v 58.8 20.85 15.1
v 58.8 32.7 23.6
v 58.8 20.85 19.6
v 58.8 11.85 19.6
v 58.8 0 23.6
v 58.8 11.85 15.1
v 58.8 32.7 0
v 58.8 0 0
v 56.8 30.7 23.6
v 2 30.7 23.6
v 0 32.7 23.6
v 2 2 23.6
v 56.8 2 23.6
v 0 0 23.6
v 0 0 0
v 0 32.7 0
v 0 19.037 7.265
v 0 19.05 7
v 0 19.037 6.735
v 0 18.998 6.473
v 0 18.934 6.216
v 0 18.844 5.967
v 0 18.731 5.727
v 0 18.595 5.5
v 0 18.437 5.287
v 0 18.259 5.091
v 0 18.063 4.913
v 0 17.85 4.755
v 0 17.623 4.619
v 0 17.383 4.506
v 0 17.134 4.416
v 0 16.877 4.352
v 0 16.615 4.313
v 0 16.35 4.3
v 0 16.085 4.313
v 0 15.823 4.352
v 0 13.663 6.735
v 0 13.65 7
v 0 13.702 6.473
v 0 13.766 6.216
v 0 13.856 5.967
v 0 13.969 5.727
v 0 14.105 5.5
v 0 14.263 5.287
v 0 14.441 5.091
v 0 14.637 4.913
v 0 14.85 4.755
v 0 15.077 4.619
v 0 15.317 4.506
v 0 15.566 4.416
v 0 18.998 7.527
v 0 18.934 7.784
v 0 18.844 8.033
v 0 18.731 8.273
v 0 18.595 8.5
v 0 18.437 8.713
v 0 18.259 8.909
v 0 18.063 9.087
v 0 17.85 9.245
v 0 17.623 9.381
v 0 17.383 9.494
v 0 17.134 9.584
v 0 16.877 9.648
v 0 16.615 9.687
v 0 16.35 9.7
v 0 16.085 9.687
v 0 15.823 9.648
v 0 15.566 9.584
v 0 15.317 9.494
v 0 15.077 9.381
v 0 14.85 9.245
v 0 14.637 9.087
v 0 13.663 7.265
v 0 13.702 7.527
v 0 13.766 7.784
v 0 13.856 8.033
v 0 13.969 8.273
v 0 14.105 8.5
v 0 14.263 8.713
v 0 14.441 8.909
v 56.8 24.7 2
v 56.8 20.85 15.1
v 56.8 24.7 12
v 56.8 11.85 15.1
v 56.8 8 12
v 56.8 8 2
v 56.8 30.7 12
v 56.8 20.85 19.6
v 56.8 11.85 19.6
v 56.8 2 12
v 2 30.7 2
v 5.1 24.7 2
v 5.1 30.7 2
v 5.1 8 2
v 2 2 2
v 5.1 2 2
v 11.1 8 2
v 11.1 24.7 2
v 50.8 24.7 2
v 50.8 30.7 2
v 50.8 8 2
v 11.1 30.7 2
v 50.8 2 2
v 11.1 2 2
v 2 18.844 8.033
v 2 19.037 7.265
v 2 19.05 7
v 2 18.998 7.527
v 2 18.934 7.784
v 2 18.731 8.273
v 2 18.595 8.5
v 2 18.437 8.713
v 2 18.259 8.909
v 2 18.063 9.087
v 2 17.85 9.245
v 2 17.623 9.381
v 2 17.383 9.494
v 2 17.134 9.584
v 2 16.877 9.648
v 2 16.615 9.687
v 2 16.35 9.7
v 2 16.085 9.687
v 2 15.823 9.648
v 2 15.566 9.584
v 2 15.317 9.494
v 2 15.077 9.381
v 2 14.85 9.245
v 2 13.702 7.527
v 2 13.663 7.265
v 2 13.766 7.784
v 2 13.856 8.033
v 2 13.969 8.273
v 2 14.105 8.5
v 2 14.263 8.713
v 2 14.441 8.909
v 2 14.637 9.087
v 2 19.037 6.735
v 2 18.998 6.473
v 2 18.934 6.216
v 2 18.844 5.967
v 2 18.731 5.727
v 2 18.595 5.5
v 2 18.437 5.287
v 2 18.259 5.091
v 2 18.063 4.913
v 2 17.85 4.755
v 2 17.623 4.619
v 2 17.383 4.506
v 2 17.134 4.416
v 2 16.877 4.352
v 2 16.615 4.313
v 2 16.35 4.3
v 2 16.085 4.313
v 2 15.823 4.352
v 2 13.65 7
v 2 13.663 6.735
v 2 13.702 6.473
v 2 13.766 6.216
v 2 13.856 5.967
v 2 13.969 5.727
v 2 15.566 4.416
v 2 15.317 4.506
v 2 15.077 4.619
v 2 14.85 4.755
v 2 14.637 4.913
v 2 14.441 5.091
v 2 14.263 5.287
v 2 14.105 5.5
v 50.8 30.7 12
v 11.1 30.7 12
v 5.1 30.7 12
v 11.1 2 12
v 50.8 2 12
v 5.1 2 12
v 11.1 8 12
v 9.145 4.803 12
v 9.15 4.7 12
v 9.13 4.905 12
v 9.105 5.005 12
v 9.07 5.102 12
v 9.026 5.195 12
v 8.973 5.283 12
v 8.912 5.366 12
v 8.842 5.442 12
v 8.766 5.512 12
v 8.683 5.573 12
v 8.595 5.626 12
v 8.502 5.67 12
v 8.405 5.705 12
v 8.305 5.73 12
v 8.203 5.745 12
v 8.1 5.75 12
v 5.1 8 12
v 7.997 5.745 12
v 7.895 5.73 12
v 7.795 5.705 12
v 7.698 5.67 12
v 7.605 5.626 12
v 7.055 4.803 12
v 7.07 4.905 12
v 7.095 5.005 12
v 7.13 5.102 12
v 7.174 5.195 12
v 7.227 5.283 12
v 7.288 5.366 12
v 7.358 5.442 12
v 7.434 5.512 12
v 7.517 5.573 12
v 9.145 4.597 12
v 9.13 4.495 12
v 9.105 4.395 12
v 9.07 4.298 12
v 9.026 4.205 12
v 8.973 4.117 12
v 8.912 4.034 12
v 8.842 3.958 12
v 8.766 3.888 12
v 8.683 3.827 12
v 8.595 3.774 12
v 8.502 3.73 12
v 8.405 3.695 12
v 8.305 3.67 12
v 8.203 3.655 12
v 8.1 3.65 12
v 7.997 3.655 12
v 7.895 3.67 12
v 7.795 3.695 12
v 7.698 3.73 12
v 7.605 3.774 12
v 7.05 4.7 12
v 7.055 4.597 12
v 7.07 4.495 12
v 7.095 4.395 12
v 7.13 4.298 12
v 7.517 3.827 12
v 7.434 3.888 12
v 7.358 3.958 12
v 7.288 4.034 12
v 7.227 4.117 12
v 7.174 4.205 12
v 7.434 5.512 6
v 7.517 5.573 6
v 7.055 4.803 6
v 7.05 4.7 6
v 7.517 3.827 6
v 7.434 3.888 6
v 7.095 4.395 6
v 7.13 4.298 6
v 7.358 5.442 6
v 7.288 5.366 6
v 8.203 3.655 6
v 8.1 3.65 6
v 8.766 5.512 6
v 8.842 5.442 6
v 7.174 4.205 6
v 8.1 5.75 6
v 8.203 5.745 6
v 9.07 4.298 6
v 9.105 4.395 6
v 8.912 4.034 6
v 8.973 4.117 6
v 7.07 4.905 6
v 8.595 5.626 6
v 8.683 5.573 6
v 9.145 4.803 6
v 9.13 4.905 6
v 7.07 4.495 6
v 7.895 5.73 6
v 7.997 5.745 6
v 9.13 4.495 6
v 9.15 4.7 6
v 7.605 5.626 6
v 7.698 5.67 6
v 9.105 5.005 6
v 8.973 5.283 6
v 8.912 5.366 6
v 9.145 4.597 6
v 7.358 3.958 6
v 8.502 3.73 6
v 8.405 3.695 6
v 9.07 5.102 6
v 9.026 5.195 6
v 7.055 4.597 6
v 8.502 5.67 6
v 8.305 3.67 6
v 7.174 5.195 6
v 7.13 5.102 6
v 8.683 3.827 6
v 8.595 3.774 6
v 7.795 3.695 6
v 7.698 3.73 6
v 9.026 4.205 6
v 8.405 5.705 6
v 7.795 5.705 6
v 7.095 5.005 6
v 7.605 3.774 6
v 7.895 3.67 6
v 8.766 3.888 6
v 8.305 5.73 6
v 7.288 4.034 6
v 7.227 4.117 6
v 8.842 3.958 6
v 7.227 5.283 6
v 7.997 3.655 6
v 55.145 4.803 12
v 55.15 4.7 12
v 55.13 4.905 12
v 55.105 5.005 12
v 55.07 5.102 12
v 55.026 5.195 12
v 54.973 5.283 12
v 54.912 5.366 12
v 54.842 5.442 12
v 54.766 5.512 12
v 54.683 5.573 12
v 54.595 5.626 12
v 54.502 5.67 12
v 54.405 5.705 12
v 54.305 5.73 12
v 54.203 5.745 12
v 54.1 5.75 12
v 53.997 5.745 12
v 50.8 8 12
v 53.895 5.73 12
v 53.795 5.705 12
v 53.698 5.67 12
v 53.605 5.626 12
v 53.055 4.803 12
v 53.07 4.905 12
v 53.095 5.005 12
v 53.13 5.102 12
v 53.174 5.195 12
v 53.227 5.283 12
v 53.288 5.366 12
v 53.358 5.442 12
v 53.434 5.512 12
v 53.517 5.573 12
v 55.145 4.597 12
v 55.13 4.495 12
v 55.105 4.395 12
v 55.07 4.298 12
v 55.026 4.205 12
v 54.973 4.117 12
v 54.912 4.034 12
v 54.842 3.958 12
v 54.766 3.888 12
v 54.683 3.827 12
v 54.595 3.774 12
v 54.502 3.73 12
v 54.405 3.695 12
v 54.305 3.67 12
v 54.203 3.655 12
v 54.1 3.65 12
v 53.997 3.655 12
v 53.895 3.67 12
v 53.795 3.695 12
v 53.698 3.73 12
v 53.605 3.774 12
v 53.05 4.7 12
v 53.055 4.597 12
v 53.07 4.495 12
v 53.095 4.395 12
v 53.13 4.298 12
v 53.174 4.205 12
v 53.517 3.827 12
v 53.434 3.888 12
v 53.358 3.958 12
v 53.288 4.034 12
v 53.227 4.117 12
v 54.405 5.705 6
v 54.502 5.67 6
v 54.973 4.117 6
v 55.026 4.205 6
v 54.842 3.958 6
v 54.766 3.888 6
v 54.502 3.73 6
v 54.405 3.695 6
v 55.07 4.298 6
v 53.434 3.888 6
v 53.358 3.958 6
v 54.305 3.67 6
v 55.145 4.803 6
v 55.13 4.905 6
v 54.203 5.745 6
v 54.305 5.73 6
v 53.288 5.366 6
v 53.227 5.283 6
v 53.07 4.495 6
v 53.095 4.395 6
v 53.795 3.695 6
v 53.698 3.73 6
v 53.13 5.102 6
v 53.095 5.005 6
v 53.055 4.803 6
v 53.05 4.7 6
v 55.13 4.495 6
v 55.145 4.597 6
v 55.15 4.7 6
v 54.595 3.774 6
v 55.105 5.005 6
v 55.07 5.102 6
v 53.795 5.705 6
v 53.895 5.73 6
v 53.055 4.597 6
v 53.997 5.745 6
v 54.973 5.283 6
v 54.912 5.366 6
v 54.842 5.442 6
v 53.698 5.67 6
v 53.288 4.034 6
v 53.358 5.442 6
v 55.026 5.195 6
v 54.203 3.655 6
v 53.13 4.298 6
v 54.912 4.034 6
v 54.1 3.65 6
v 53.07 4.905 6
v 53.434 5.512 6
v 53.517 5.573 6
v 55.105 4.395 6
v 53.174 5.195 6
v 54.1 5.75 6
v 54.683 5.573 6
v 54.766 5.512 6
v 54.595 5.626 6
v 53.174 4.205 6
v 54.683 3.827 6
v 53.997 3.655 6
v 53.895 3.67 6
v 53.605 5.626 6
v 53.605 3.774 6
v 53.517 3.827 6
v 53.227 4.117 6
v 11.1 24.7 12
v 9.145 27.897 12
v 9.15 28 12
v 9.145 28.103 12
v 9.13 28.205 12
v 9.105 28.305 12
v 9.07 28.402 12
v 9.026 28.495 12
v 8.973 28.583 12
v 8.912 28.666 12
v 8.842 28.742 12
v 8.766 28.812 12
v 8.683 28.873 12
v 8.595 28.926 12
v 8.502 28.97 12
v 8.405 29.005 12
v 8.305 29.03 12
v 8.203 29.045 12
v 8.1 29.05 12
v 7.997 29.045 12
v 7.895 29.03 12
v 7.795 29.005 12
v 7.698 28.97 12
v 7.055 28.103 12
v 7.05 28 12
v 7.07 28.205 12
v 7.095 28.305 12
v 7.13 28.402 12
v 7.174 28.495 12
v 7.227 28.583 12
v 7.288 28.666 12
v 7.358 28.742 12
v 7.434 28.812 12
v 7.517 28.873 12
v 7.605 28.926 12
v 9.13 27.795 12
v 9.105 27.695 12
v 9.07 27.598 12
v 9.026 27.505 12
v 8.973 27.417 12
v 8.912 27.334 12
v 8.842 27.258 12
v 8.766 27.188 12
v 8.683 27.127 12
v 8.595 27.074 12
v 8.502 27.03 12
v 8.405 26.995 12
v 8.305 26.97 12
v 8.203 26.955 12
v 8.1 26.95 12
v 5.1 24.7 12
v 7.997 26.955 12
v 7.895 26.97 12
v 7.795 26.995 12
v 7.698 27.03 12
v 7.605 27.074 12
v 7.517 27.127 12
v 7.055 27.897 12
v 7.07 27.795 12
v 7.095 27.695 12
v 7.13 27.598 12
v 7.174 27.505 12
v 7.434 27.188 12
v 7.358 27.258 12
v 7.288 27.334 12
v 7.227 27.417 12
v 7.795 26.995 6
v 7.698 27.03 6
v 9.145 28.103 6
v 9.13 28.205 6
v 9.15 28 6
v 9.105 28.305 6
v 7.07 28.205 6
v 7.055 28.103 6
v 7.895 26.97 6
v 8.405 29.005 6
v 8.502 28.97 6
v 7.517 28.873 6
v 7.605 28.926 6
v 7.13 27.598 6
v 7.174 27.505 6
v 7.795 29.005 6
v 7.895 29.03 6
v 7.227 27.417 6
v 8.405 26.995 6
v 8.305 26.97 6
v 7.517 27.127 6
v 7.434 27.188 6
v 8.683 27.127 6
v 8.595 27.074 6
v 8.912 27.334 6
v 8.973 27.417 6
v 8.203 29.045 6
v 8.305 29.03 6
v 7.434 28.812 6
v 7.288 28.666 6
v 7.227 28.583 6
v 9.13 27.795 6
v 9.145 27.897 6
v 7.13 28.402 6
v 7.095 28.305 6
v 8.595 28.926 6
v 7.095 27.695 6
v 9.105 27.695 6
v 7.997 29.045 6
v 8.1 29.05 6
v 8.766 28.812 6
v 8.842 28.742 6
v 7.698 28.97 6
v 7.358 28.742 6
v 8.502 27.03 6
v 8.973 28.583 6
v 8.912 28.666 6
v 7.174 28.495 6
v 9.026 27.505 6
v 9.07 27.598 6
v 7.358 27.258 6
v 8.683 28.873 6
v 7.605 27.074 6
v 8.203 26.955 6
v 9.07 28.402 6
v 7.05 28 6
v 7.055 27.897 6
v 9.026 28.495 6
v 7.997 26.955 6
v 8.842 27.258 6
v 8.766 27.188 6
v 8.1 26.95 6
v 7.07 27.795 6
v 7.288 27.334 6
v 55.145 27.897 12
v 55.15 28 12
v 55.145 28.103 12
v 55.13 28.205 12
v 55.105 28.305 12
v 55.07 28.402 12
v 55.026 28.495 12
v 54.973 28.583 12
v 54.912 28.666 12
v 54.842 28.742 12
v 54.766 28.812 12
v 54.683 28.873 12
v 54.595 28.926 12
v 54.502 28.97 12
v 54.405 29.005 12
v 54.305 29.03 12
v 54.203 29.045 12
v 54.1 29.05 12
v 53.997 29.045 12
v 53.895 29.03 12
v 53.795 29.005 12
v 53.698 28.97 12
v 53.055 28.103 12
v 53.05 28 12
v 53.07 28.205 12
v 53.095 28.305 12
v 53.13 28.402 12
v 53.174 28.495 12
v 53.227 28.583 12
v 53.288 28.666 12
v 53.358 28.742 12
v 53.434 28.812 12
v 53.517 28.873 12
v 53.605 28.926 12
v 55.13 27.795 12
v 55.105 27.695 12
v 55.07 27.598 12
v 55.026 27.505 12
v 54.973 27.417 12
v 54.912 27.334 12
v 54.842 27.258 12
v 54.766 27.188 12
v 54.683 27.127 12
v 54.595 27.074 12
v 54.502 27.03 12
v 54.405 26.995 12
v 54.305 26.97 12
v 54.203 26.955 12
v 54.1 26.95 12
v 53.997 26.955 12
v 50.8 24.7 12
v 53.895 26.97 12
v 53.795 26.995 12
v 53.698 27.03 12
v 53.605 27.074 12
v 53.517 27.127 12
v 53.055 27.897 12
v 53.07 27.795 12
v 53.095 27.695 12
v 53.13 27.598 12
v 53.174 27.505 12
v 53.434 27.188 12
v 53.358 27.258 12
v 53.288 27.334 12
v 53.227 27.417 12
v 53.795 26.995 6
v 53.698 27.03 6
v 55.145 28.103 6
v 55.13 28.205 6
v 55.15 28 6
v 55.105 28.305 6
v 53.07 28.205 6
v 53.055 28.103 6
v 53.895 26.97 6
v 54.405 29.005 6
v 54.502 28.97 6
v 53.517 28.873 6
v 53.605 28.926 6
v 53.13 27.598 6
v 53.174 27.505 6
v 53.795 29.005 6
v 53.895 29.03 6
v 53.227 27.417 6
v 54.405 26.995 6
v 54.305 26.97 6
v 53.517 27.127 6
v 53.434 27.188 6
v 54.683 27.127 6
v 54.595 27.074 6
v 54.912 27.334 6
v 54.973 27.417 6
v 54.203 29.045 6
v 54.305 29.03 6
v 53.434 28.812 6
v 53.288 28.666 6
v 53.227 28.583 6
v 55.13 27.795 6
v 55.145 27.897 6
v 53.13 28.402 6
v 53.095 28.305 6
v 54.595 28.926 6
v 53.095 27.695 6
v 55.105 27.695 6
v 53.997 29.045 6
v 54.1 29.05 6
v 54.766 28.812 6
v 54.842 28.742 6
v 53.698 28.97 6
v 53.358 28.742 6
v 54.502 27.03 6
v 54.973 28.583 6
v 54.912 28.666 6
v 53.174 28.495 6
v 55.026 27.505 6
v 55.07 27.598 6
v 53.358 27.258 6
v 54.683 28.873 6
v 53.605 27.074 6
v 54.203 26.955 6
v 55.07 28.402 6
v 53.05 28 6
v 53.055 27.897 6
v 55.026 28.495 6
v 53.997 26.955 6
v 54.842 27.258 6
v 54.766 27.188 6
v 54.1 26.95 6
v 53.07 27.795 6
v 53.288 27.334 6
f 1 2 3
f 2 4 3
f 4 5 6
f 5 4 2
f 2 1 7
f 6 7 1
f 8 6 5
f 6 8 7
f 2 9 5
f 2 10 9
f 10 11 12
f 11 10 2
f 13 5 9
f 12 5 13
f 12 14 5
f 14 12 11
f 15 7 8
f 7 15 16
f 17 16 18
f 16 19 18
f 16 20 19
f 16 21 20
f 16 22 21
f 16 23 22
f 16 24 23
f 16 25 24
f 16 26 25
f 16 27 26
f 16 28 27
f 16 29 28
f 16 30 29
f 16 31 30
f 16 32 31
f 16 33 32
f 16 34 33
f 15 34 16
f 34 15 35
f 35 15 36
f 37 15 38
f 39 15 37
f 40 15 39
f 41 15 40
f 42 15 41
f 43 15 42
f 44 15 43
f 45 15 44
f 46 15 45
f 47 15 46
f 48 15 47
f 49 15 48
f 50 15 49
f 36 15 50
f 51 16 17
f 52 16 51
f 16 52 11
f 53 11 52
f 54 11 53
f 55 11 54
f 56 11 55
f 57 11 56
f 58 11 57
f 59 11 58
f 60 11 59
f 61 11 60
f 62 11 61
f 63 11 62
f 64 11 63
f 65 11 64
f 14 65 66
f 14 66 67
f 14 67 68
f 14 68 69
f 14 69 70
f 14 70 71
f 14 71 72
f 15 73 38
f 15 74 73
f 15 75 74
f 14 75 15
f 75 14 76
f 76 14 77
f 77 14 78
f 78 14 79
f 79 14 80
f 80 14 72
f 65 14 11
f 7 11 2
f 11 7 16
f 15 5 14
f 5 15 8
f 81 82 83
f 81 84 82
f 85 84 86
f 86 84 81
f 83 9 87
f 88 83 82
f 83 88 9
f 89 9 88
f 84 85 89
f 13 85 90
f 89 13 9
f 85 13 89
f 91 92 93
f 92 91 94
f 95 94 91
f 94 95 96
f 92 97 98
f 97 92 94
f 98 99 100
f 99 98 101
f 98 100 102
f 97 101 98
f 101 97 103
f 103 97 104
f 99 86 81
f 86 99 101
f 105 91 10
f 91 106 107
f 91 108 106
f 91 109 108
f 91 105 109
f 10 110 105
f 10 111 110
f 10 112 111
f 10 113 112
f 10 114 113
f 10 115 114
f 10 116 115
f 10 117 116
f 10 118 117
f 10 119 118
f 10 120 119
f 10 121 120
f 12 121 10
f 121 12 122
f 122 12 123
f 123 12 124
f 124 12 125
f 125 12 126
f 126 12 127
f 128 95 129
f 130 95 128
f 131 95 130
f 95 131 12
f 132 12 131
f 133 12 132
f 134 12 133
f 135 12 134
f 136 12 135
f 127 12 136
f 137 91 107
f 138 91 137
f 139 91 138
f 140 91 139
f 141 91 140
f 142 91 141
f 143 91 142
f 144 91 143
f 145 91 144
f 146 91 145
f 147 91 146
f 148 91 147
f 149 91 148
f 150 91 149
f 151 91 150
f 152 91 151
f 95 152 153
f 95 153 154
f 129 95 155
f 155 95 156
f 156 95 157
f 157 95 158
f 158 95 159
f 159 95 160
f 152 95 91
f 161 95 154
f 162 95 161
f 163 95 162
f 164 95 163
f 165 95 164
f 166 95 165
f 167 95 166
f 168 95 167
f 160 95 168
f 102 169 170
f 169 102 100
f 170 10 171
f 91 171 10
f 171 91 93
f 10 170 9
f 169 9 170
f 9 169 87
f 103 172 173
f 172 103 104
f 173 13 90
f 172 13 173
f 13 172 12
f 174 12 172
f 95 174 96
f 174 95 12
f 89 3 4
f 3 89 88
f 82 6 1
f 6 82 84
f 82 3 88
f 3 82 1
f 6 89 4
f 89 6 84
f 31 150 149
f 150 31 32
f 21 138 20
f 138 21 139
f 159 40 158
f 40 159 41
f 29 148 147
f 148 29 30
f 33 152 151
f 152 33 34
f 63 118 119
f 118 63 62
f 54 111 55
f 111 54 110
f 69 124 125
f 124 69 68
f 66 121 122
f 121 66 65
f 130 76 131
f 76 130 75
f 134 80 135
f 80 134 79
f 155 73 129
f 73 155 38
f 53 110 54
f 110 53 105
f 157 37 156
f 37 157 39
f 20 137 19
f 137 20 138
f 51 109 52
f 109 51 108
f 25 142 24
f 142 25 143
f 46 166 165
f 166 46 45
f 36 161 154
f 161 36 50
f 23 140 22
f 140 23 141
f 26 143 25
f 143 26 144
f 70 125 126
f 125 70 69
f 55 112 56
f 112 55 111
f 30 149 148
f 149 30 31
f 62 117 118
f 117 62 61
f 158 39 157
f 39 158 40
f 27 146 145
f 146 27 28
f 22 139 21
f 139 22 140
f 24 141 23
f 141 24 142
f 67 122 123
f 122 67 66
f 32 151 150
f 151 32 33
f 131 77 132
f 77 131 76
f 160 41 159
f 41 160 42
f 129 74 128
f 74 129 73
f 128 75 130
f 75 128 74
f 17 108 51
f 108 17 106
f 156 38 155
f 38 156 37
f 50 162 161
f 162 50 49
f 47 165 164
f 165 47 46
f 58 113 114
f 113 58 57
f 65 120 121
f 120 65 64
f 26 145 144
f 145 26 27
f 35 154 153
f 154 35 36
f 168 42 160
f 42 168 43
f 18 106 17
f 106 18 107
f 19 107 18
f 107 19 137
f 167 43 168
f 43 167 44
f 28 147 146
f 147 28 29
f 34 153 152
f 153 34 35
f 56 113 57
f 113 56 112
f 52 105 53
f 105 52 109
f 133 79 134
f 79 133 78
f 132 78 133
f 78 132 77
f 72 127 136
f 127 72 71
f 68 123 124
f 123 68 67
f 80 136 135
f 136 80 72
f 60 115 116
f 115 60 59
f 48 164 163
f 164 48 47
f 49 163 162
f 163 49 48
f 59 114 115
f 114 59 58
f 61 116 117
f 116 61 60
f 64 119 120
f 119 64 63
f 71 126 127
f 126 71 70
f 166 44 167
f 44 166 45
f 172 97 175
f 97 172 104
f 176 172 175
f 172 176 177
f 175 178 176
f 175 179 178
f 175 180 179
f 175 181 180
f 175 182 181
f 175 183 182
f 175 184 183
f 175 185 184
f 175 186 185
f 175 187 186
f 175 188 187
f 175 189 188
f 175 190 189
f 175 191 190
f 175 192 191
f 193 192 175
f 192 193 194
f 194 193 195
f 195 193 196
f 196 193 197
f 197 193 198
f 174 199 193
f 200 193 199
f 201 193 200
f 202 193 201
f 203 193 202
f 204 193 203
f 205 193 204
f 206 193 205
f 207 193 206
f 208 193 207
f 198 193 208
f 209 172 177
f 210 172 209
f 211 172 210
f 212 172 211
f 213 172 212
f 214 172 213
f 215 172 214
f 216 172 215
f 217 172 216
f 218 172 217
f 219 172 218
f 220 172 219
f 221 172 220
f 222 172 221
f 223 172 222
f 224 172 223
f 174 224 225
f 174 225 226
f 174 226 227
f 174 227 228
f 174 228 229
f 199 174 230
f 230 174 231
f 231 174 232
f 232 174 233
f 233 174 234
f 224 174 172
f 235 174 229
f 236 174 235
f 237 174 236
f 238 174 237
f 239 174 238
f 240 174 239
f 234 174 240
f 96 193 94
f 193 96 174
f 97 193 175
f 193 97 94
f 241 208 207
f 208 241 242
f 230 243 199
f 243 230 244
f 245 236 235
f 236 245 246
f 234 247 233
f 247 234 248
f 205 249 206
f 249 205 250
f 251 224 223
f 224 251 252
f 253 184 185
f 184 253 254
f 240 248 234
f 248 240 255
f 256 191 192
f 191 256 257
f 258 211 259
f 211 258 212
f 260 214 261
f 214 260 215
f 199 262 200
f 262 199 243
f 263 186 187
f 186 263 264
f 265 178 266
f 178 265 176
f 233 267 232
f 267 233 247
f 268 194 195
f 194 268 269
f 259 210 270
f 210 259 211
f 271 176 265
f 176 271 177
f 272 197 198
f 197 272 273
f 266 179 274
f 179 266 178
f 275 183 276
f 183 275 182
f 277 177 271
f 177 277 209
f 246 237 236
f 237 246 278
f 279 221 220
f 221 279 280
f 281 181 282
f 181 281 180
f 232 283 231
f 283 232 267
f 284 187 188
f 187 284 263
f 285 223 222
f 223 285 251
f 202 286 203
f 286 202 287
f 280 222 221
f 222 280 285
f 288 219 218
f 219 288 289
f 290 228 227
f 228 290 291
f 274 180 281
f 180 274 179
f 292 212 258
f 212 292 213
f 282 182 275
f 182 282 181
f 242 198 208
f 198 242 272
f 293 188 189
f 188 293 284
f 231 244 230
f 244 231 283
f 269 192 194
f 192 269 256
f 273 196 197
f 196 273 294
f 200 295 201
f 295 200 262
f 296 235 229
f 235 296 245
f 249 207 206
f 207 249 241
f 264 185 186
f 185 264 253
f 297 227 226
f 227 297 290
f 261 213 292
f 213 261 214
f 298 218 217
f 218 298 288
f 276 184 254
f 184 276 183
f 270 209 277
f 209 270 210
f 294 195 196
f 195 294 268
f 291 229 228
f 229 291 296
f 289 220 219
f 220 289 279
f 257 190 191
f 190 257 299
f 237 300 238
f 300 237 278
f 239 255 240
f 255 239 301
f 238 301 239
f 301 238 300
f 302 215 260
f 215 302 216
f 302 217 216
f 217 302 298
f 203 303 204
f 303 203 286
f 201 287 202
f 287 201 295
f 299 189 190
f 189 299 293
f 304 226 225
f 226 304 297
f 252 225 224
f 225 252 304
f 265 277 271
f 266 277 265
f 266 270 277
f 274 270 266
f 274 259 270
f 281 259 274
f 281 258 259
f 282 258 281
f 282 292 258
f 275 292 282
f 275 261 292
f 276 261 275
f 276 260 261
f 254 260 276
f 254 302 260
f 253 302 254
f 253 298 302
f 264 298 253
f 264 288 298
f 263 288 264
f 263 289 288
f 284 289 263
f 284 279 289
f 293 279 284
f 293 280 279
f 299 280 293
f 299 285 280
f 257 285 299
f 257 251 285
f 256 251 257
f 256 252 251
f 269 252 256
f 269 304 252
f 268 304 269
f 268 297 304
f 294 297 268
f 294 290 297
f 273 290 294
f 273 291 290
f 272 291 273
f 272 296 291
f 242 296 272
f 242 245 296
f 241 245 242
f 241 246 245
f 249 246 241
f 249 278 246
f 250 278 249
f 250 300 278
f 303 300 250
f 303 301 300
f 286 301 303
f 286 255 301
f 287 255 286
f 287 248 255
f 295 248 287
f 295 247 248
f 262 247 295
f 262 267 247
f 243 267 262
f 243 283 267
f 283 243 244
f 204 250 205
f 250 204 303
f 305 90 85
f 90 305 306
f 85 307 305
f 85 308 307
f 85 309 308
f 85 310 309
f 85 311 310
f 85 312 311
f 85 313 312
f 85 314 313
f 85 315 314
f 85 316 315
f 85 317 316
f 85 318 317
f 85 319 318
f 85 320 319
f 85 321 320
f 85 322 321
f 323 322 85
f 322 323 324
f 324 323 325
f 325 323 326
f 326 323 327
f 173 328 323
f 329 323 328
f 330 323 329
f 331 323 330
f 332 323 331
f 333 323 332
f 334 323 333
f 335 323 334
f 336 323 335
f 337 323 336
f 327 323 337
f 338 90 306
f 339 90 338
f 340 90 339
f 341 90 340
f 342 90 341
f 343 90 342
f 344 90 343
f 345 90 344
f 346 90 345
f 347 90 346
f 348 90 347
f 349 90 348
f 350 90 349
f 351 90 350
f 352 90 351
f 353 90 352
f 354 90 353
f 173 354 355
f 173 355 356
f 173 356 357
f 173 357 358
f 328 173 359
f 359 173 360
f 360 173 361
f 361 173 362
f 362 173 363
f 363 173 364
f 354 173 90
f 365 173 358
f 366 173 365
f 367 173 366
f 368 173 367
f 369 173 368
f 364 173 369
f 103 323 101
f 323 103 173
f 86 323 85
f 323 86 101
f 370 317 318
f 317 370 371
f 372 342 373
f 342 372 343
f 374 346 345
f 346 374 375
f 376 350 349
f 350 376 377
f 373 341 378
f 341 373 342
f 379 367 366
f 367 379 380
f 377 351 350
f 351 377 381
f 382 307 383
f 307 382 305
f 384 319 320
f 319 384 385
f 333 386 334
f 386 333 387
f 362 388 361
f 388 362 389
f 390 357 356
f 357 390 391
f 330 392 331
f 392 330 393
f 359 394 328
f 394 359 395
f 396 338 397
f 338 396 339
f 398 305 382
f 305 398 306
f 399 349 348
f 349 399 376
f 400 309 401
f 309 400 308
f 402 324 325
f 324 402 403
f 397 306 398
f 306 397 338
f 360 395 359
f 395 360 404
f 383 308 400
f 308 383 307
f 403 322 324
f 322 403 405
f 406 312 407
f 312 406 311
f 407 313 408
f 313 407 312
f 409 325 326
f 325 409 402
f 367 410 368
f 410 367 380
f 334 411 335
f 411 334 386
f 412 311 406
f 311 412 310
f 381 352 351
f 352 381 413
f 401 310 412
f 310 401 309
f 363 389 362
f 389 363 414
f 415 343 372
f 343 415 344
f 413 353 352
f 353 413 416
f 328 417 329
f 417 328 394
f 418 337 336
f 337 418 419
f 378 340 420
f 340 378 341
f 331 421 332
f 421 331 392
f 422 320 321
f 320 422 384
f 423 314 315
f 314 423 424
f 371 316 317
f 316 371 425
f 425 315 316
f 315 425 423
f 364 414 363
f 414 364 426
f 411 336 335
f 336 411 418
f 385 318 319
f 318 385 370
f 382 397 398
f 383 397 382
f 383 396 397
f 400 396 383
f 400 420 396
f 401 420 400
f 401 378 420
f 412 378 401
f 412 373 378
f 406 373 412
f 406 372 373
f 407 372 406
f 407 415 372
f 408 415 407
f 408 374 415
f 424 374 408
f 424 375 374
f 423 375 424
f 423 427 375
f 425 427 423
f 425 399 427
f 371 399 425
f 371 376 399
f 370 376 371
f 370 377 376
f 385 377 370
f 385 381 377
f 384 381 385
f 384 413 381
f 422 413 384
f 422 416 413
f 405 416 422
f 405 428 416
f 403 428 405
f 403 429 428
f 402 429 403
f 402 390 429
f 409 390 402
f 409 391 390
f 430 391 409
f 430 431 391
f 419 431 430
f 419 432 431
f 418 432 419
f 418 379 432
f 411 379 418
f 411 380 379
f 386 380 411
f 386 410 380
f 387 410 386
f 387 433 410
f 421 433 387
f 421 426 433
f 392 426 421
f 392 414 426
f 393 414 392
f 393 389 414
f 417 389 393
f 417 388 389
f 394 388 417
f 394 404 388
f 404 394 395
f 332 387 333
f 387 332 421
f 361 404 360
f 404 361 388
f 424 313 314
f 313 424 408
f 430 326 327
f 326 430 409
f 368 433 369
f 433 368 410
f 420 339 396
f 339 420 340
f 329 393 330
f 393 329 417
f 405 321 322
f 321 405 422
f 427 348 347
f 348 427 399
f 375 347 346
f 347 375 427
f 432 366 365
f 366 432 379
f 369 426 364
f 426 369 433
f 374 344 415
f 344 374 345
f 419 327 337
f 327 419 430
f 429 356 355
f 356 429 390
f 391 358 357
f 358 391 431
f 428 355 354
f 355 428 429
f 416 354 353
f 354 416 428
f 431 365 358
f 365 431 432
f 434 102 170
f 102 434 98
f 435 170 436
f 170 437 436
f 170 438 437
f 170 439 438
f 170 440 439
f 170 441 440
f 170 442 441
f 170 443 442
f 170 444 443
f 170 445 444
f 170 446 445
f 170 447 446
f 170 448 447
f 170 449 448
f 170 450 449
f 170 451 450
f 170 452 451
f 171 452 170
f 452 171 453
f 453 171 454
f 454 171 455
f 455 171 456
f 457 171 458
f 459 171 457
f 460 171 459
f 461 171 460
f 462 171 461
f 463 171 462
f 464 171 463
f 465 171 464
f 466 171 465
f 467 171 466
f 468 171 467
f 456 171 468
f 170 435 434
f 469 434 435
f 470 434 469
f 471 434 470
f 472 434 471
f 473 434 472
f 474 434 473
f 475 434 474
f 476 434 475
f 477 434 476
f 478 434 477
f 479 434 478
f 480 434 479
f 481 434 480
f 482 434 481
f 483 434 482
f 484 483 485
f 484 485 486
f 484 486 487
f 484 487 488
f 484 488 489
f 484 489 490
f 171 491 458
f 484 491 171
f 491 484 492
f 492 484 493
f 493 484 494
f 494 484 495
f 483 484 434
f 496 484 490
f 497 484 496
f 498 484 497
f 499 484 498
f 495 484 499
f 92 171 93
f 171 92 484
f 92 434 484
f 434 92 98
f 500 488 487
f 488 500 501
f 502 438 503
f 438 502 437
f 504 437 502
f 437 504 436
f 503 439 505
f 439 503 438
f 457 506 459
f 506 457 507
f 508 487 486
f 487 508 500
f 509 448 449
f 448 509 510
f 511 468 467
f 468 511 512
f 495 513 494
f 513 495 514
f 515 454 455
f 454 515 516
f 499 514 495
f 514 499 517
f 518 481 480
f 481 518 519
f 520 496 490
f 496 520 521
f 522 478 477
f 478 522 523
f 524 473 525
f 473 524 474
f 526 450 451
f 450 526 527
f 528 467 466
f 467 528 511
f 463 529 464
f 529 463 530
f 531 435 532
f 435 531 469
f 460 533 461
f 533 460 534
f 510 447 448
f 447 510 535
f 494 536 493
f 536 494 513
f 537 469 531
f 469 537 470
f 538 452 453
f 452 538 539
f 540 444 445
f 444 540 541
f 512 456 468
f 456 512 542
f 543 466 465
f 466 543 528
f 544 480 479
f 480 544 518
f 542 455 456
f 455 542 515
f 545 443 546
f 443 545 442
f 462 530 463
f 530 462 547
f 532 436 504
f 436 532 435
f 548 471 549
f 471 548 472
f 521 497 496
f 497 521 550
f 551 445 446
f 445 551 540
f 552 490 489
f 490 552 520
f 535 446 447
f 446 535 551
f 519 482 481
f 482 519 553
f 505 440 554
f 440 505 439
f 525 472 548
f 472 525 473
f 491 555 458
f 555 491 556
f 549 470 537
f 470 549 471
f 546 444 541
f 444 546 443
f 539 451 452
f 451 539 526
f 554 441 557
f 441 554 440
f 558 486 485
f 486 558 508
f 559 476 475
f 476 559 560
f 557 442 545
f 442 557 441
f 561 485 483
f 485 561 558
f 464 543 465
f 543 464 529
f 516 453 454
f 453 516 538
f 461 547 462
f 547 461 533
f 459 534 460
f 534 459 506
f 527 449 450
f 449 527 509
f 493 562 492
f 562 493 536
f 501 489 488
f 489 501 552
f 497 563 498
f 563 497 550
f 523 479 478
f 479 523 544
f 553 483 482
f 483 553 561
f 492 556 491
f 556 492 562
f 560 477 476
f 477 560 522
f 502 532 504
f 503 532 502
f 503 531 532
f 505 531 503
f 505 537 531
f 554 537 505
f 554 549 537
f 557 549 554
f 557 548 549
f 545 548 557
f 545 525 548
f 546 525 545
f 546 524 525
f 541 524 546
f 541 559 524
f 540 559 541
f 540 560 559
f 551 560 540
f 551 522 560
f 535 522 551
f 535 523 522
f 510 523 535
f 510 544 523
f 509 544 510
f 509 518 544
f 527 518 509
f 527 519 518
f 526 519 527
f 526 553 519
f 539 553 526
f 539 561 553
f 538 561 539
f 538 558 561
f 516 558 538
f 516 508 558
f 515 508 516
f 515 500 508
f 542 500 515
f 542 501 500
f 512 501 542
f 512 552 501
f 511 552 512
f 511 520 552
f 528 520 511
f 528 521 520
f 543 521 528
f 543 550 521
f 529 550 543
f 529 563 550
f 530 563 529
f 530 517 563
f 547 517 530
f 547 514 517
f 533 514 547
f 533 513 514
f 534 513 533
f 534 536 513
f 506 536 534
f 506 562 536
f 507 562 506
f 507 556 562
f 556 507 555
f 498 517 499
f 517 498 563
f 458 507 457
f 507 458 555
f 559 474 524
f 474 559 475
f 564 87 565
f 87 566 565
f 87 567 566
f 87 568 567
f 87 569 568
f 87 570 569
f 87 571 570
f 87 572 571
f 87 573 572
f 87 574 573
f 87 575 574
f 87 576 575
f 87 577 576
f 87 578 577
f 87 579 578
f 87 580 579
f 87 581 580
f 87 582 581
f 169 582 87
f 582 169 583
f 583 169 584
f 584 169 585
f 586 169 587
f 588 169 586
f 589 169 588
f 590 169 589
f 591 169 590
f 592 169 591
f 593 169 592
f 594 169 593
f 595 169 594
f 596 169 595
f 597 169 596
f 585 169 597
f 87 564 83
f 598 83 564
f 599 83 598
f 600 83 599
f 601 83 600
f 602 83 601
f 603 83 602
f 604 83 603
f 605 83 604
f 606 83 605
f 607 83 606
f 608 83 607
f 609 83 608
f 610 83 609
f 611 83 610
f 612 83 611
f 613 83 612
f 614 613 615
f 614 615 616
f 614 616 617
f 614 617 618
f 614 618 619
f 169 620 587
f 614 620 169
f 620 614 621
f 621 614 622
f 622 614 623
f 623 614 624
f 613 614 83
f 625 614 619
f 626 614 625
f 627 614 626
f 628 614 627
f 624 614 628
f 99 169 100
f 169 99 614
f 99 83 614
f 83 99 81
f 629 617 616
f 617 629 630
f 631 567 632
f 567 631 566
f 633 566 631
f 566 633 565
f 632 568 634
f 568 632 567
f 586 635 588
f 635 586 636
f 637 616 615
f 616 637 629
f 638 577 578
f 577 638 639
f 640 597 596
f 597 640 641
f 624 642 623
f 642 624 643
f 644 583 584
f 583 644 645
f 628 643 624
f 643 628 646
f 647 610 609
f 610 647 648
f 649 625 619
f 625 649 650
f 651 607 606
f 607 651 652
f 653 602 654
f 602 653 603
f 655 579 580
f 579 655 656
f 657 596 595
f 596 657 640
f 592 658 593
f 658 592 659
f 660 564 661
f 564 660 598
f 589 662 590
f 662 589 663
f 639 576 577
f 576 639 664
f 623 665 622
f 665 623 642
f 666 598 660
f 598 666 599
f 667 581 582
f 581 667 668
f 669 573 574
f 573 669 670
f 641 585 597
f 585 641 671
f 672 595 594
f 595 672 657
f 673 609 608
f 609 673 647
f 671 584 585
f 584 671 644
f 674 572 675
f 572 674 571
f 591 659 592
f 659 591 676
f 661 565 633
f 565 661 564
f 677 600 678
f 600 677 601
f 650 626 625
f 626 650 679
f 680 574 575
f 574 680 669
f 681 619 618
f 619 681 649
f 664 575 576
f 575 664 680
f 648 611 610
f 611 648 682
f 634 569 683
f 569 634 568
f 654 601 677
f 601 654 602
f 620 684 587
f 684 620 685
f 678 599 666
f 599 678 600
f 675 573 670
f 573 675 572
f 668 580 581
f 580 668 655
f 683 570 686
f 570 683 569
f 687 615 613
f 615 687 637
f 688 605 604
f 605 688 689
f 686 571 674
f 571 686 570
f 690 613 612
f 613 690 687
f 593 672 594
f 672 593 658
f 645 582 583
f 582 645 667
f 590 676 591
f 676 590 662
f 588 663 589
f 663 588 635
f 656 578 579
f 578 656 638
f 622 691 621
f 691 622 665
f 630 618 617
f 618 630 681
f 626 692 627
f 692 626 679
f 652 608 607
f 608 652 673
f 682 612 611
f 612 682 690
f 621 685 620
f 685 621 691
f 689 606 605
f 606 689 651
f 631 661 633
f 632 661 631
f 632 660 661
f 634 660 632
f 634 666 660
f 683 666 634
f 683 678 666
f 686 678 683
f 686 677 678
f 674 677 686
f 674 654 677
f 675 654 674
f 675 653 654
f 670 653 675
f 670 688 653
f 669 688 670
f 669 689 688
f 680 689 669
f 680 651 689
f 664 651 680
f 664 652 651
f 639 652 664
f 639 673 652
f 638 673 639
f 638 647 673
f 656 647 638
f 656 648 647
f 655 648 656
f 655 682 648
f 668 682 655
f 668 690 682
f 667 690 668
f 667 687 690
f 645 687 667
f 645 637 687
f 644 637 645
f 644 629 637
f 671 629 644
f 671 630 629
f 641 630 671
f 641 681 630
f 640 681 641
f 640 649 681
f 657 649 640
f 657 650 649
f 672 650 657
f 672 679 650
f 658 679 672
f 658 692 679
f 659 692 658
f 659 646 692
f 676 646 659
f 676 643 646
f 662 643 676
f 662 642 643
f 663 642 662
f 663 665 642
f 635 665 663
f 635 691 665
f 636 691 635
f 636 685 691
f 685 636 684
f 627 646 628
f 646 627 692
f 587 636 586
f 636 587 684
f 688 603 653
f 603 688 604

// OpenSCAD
// OBS VCR Remote — ESP32 enclosure
// 
// Hardware:
//   * ESP32 DOIT DevKit v1 (~54.4 x 28.3 mm)
//   * 5mm IR LED through the front wall
//   * TO-92 NPN transistor inside, held by its own leads
//   * Pin headers protrude ~5mm below the PCB into the cavity below
//
// Mechanical: Four risers in the corners of the inner cavity. PCB
// sits on top of the risers and is bolted down with four M2.5
// self-tapping screws that thread into the riser tops. Lid is
// snap-fit only (no screws through the lid).
//
// Slicer print orientation: base bottom-down, lid lip-up (already
// flipped in the layout block at the bottom of this file).
//
// Export each part to its own STL from the CLI:
//   openscad -D 'part="base"' -o base.stl enclosure.scad
//   openscad -D 'part="lid"'  -o lid.stl  enclosure.scad
// Or pick a part from the Customizer dropdown and File > Export > STL.

/* [Render] */
part = "base";  // [all, base, lid]

/* [Board] */
board_l       = 54.4;  // PCB length
board_w       = 28.3;  // PCB width
board_h       = 1.6;   // PCB thickness
pin_drop      = 9.0;   // header pin protrusion below PCB
// 13.5 top clearence
top_clearance = 10.0;  // tallest stuff above PCB (USB conn / RF can)

/* [PCB mounting holes] */
mount_inset_x_back  = 2.5;  // USB-end edge → mounting hole (long-axis)
mount_inset_x_front = 5.9;  // LED-end edge → mounting hole (long-axis);
                            // measured: hole centers are 46mm apart on the
                            // long axis, so 54.4 - 46 - 2.5 = 5.9
mount_inset_y       = 2.5;  // each long edge → mounting hole (short-axis)

/* [USB cutout] */
usb_w        = 9.0;    // micro-USB cutout width
usb_h        = 4.5;    // cutout height
usb_pcb_gap  = 1.5;    // gap above PCB top surface

/* [IR LED window] */
led_d = 5.4;           // 5mm LED + 0.4mm slip fit
led_z = 5;             // LED center height above inside floor (in the
                       // cavity below the PCB; max ≈ cavity_h - led_d/2)

/* [M2.5 corner risers] */
riser_size    = 6.0;   // square riser side length (fused to corner walls)
screw_pilot_d = 2.1;   // M2.5 self-tapping pilot into the riser
pilot_depth   = 6.0;   // pilot hole depth from riser top, downward

/* [Shell] */
wall        = 2;
board_clear = 0.4;     // PCB-to-wall slop (0.2mm per side)
lid_lip     = 1;
lid_gap     = 0.2;     // lid-to-base clearance
vent_slots  = 5;       // 0 disables

/* [Hidden] */
$fn = 64;
eps = 0.01;

// ---- derived ----
inner_l     = board_l + board_clear;
inner_w     = board_w + board_clear;
cavity_h    = pin_drop + 1;
shelf_top_z = wall + cavity_h;          // PCB rests at this Z
inside_h    = cavity_h + board_h + top_clearance;
out_l       = inner_l + 2*wall;
out_w       = inner_w + 2*wall;
out_h       = inside_h + wall;

// PCB origin within inner cavity (centered)
pcb_x0 = board_clear/2;
pcb_y0 = board_clear/2;

// Four risers. Each entry is [riser-corner-xy, pilot-xy] in absolute
// (post-wall) coordinates.
//
// The USB-end (back) risers are corner-anchored (touching both adjacent
// inner walls). The LED-end (front) risers slide inward along the long
// axis to match the actual PCB hole position — they remain anchored to
// the long-side wall (top/bottom in the "vertical" layout) but float
// away from the LED wall by mount_inset_x_front - 2.5mm.
//
// pilot_x_front / pilot_x_back: absolute X of pilot at each end.
// front_cube_x: X of the LED-end cube (centered on the pilot).
pilot_x_front = wall + pcb_x0 + mount_inset_x_front;
pilot_x_back  = wall + pcb_x0 + board_l - mount_inset_x_back;
front_cube_x  = pilot_x_front - riser_size/2;
back_cube_x   = wall + inner_l - riser_size;

risers = [
    // bottom-left (LED end, low Y) — anchored to bottom wall, slid inward in X
    [[front_cube_x, wall],
     [pilot_x_front, wall + pcb_y0 + mount_inset_y]],
    // bottom-right (USB end, low Y) — corner-anchored
    [[back_cube_x, wall],
     [pilot_x_back, wall + pcb_y0 + mount_inset_y]],
    // top-left (LED end, high Y) — anchored to top wall, slid inward in X
    [[front_cube_x, wall + inner_w - riser_size],
     [pilot_x_front, wall + pcb_y0 + board_w - mount_inset_y]],
    // top-right (USB end, high Y) — corner-anchored
    [[back_cube_x, wall + inner_w - riser_size],
     [pilot_x_back, wall + pcb_y0 + board_w - mount_inset_y]],
];

module base() {
    // Hollow shell with wall cutouts
    difference() {
        cube([out_l, out_w, out_h]);

        // hollow interior
        translate([wall, wall, wall])
            cube([inner_l, inner_w, inside_h + eps]);

        // USB cutout, back wall (+X)
        translate([out_l - wall - eps,
                   out_w/2 - usb_w/2,
                   shelf_top_z + board_h + usb_pcb_gap])
            cube([wall + 2*eps, usb_w, usb_h]);

        // IR LED window, front wall (-X)
        translate([-eps, out_w/2, wall + led_z])
            rotate([0, 90, 0])
                cylinder(d=led_d, h=wall + 2*eps);
    }

    // Four square corner risers fused to the adjacent inner walls.
    // Added AFTER the cavity is hollowed, otherwise they'd be subtracted out.
    for (r = risers)
        difference() {
            translate([r[0][0], r[0][1], wall])
                cube([riser_size, riser_size, cavity_h]);
            translate([r[1][0], r[1][1], wall + cavity_h - pilot_depth])
                cylinder(d=screw_pilot_d, h=pilot_depth + eps);
        }
}

module lid() {
    difference() {
        union() {
            cube([out_l, out_w, wall]);
            if (lid_lip > 0) {
                translate([wall + lid_gap, wall + lid_gap, -lid_lip])
                    cube([inner_l - 2*lid_gap,
                          inner_w - 2*lid_gap,
                          lid_lip]);
            }
        }
        if (vent_slots > 0) {
            slot_w  = 2;
            slot_l  = out_w * 0.4;
            spacing = out_l / (vent_slots + 1);
            for (i = [1:vent_slots])
                translate([i*spacing - slot_w/2,
                           (out_w - slot_l)/2,
                           -lid_lip - eps])
                    cube([slot_w, slot_l, wall + lid_lip + 2*eps]);
        }
    }
}

// Render the part(s) selected by the `part` parameter at the top.
// "all" lays out base + flipped lid side-by-side for preview.
// "base" / "lid" emit a single body in print orientation for STL export.

if (part == "all") {
    base();
    translate([0, 2*out_w + 5, wall])
        rotate([180, 0, 0])
            lid();
} else if (part == "base") {
    base();
} else if (part == "lid") {
    // Lid flipped lip-up so the plate top sits on the bed.
    translate([0, 0, wall])
        rotate([180, 0, 0])
            lid();
}
